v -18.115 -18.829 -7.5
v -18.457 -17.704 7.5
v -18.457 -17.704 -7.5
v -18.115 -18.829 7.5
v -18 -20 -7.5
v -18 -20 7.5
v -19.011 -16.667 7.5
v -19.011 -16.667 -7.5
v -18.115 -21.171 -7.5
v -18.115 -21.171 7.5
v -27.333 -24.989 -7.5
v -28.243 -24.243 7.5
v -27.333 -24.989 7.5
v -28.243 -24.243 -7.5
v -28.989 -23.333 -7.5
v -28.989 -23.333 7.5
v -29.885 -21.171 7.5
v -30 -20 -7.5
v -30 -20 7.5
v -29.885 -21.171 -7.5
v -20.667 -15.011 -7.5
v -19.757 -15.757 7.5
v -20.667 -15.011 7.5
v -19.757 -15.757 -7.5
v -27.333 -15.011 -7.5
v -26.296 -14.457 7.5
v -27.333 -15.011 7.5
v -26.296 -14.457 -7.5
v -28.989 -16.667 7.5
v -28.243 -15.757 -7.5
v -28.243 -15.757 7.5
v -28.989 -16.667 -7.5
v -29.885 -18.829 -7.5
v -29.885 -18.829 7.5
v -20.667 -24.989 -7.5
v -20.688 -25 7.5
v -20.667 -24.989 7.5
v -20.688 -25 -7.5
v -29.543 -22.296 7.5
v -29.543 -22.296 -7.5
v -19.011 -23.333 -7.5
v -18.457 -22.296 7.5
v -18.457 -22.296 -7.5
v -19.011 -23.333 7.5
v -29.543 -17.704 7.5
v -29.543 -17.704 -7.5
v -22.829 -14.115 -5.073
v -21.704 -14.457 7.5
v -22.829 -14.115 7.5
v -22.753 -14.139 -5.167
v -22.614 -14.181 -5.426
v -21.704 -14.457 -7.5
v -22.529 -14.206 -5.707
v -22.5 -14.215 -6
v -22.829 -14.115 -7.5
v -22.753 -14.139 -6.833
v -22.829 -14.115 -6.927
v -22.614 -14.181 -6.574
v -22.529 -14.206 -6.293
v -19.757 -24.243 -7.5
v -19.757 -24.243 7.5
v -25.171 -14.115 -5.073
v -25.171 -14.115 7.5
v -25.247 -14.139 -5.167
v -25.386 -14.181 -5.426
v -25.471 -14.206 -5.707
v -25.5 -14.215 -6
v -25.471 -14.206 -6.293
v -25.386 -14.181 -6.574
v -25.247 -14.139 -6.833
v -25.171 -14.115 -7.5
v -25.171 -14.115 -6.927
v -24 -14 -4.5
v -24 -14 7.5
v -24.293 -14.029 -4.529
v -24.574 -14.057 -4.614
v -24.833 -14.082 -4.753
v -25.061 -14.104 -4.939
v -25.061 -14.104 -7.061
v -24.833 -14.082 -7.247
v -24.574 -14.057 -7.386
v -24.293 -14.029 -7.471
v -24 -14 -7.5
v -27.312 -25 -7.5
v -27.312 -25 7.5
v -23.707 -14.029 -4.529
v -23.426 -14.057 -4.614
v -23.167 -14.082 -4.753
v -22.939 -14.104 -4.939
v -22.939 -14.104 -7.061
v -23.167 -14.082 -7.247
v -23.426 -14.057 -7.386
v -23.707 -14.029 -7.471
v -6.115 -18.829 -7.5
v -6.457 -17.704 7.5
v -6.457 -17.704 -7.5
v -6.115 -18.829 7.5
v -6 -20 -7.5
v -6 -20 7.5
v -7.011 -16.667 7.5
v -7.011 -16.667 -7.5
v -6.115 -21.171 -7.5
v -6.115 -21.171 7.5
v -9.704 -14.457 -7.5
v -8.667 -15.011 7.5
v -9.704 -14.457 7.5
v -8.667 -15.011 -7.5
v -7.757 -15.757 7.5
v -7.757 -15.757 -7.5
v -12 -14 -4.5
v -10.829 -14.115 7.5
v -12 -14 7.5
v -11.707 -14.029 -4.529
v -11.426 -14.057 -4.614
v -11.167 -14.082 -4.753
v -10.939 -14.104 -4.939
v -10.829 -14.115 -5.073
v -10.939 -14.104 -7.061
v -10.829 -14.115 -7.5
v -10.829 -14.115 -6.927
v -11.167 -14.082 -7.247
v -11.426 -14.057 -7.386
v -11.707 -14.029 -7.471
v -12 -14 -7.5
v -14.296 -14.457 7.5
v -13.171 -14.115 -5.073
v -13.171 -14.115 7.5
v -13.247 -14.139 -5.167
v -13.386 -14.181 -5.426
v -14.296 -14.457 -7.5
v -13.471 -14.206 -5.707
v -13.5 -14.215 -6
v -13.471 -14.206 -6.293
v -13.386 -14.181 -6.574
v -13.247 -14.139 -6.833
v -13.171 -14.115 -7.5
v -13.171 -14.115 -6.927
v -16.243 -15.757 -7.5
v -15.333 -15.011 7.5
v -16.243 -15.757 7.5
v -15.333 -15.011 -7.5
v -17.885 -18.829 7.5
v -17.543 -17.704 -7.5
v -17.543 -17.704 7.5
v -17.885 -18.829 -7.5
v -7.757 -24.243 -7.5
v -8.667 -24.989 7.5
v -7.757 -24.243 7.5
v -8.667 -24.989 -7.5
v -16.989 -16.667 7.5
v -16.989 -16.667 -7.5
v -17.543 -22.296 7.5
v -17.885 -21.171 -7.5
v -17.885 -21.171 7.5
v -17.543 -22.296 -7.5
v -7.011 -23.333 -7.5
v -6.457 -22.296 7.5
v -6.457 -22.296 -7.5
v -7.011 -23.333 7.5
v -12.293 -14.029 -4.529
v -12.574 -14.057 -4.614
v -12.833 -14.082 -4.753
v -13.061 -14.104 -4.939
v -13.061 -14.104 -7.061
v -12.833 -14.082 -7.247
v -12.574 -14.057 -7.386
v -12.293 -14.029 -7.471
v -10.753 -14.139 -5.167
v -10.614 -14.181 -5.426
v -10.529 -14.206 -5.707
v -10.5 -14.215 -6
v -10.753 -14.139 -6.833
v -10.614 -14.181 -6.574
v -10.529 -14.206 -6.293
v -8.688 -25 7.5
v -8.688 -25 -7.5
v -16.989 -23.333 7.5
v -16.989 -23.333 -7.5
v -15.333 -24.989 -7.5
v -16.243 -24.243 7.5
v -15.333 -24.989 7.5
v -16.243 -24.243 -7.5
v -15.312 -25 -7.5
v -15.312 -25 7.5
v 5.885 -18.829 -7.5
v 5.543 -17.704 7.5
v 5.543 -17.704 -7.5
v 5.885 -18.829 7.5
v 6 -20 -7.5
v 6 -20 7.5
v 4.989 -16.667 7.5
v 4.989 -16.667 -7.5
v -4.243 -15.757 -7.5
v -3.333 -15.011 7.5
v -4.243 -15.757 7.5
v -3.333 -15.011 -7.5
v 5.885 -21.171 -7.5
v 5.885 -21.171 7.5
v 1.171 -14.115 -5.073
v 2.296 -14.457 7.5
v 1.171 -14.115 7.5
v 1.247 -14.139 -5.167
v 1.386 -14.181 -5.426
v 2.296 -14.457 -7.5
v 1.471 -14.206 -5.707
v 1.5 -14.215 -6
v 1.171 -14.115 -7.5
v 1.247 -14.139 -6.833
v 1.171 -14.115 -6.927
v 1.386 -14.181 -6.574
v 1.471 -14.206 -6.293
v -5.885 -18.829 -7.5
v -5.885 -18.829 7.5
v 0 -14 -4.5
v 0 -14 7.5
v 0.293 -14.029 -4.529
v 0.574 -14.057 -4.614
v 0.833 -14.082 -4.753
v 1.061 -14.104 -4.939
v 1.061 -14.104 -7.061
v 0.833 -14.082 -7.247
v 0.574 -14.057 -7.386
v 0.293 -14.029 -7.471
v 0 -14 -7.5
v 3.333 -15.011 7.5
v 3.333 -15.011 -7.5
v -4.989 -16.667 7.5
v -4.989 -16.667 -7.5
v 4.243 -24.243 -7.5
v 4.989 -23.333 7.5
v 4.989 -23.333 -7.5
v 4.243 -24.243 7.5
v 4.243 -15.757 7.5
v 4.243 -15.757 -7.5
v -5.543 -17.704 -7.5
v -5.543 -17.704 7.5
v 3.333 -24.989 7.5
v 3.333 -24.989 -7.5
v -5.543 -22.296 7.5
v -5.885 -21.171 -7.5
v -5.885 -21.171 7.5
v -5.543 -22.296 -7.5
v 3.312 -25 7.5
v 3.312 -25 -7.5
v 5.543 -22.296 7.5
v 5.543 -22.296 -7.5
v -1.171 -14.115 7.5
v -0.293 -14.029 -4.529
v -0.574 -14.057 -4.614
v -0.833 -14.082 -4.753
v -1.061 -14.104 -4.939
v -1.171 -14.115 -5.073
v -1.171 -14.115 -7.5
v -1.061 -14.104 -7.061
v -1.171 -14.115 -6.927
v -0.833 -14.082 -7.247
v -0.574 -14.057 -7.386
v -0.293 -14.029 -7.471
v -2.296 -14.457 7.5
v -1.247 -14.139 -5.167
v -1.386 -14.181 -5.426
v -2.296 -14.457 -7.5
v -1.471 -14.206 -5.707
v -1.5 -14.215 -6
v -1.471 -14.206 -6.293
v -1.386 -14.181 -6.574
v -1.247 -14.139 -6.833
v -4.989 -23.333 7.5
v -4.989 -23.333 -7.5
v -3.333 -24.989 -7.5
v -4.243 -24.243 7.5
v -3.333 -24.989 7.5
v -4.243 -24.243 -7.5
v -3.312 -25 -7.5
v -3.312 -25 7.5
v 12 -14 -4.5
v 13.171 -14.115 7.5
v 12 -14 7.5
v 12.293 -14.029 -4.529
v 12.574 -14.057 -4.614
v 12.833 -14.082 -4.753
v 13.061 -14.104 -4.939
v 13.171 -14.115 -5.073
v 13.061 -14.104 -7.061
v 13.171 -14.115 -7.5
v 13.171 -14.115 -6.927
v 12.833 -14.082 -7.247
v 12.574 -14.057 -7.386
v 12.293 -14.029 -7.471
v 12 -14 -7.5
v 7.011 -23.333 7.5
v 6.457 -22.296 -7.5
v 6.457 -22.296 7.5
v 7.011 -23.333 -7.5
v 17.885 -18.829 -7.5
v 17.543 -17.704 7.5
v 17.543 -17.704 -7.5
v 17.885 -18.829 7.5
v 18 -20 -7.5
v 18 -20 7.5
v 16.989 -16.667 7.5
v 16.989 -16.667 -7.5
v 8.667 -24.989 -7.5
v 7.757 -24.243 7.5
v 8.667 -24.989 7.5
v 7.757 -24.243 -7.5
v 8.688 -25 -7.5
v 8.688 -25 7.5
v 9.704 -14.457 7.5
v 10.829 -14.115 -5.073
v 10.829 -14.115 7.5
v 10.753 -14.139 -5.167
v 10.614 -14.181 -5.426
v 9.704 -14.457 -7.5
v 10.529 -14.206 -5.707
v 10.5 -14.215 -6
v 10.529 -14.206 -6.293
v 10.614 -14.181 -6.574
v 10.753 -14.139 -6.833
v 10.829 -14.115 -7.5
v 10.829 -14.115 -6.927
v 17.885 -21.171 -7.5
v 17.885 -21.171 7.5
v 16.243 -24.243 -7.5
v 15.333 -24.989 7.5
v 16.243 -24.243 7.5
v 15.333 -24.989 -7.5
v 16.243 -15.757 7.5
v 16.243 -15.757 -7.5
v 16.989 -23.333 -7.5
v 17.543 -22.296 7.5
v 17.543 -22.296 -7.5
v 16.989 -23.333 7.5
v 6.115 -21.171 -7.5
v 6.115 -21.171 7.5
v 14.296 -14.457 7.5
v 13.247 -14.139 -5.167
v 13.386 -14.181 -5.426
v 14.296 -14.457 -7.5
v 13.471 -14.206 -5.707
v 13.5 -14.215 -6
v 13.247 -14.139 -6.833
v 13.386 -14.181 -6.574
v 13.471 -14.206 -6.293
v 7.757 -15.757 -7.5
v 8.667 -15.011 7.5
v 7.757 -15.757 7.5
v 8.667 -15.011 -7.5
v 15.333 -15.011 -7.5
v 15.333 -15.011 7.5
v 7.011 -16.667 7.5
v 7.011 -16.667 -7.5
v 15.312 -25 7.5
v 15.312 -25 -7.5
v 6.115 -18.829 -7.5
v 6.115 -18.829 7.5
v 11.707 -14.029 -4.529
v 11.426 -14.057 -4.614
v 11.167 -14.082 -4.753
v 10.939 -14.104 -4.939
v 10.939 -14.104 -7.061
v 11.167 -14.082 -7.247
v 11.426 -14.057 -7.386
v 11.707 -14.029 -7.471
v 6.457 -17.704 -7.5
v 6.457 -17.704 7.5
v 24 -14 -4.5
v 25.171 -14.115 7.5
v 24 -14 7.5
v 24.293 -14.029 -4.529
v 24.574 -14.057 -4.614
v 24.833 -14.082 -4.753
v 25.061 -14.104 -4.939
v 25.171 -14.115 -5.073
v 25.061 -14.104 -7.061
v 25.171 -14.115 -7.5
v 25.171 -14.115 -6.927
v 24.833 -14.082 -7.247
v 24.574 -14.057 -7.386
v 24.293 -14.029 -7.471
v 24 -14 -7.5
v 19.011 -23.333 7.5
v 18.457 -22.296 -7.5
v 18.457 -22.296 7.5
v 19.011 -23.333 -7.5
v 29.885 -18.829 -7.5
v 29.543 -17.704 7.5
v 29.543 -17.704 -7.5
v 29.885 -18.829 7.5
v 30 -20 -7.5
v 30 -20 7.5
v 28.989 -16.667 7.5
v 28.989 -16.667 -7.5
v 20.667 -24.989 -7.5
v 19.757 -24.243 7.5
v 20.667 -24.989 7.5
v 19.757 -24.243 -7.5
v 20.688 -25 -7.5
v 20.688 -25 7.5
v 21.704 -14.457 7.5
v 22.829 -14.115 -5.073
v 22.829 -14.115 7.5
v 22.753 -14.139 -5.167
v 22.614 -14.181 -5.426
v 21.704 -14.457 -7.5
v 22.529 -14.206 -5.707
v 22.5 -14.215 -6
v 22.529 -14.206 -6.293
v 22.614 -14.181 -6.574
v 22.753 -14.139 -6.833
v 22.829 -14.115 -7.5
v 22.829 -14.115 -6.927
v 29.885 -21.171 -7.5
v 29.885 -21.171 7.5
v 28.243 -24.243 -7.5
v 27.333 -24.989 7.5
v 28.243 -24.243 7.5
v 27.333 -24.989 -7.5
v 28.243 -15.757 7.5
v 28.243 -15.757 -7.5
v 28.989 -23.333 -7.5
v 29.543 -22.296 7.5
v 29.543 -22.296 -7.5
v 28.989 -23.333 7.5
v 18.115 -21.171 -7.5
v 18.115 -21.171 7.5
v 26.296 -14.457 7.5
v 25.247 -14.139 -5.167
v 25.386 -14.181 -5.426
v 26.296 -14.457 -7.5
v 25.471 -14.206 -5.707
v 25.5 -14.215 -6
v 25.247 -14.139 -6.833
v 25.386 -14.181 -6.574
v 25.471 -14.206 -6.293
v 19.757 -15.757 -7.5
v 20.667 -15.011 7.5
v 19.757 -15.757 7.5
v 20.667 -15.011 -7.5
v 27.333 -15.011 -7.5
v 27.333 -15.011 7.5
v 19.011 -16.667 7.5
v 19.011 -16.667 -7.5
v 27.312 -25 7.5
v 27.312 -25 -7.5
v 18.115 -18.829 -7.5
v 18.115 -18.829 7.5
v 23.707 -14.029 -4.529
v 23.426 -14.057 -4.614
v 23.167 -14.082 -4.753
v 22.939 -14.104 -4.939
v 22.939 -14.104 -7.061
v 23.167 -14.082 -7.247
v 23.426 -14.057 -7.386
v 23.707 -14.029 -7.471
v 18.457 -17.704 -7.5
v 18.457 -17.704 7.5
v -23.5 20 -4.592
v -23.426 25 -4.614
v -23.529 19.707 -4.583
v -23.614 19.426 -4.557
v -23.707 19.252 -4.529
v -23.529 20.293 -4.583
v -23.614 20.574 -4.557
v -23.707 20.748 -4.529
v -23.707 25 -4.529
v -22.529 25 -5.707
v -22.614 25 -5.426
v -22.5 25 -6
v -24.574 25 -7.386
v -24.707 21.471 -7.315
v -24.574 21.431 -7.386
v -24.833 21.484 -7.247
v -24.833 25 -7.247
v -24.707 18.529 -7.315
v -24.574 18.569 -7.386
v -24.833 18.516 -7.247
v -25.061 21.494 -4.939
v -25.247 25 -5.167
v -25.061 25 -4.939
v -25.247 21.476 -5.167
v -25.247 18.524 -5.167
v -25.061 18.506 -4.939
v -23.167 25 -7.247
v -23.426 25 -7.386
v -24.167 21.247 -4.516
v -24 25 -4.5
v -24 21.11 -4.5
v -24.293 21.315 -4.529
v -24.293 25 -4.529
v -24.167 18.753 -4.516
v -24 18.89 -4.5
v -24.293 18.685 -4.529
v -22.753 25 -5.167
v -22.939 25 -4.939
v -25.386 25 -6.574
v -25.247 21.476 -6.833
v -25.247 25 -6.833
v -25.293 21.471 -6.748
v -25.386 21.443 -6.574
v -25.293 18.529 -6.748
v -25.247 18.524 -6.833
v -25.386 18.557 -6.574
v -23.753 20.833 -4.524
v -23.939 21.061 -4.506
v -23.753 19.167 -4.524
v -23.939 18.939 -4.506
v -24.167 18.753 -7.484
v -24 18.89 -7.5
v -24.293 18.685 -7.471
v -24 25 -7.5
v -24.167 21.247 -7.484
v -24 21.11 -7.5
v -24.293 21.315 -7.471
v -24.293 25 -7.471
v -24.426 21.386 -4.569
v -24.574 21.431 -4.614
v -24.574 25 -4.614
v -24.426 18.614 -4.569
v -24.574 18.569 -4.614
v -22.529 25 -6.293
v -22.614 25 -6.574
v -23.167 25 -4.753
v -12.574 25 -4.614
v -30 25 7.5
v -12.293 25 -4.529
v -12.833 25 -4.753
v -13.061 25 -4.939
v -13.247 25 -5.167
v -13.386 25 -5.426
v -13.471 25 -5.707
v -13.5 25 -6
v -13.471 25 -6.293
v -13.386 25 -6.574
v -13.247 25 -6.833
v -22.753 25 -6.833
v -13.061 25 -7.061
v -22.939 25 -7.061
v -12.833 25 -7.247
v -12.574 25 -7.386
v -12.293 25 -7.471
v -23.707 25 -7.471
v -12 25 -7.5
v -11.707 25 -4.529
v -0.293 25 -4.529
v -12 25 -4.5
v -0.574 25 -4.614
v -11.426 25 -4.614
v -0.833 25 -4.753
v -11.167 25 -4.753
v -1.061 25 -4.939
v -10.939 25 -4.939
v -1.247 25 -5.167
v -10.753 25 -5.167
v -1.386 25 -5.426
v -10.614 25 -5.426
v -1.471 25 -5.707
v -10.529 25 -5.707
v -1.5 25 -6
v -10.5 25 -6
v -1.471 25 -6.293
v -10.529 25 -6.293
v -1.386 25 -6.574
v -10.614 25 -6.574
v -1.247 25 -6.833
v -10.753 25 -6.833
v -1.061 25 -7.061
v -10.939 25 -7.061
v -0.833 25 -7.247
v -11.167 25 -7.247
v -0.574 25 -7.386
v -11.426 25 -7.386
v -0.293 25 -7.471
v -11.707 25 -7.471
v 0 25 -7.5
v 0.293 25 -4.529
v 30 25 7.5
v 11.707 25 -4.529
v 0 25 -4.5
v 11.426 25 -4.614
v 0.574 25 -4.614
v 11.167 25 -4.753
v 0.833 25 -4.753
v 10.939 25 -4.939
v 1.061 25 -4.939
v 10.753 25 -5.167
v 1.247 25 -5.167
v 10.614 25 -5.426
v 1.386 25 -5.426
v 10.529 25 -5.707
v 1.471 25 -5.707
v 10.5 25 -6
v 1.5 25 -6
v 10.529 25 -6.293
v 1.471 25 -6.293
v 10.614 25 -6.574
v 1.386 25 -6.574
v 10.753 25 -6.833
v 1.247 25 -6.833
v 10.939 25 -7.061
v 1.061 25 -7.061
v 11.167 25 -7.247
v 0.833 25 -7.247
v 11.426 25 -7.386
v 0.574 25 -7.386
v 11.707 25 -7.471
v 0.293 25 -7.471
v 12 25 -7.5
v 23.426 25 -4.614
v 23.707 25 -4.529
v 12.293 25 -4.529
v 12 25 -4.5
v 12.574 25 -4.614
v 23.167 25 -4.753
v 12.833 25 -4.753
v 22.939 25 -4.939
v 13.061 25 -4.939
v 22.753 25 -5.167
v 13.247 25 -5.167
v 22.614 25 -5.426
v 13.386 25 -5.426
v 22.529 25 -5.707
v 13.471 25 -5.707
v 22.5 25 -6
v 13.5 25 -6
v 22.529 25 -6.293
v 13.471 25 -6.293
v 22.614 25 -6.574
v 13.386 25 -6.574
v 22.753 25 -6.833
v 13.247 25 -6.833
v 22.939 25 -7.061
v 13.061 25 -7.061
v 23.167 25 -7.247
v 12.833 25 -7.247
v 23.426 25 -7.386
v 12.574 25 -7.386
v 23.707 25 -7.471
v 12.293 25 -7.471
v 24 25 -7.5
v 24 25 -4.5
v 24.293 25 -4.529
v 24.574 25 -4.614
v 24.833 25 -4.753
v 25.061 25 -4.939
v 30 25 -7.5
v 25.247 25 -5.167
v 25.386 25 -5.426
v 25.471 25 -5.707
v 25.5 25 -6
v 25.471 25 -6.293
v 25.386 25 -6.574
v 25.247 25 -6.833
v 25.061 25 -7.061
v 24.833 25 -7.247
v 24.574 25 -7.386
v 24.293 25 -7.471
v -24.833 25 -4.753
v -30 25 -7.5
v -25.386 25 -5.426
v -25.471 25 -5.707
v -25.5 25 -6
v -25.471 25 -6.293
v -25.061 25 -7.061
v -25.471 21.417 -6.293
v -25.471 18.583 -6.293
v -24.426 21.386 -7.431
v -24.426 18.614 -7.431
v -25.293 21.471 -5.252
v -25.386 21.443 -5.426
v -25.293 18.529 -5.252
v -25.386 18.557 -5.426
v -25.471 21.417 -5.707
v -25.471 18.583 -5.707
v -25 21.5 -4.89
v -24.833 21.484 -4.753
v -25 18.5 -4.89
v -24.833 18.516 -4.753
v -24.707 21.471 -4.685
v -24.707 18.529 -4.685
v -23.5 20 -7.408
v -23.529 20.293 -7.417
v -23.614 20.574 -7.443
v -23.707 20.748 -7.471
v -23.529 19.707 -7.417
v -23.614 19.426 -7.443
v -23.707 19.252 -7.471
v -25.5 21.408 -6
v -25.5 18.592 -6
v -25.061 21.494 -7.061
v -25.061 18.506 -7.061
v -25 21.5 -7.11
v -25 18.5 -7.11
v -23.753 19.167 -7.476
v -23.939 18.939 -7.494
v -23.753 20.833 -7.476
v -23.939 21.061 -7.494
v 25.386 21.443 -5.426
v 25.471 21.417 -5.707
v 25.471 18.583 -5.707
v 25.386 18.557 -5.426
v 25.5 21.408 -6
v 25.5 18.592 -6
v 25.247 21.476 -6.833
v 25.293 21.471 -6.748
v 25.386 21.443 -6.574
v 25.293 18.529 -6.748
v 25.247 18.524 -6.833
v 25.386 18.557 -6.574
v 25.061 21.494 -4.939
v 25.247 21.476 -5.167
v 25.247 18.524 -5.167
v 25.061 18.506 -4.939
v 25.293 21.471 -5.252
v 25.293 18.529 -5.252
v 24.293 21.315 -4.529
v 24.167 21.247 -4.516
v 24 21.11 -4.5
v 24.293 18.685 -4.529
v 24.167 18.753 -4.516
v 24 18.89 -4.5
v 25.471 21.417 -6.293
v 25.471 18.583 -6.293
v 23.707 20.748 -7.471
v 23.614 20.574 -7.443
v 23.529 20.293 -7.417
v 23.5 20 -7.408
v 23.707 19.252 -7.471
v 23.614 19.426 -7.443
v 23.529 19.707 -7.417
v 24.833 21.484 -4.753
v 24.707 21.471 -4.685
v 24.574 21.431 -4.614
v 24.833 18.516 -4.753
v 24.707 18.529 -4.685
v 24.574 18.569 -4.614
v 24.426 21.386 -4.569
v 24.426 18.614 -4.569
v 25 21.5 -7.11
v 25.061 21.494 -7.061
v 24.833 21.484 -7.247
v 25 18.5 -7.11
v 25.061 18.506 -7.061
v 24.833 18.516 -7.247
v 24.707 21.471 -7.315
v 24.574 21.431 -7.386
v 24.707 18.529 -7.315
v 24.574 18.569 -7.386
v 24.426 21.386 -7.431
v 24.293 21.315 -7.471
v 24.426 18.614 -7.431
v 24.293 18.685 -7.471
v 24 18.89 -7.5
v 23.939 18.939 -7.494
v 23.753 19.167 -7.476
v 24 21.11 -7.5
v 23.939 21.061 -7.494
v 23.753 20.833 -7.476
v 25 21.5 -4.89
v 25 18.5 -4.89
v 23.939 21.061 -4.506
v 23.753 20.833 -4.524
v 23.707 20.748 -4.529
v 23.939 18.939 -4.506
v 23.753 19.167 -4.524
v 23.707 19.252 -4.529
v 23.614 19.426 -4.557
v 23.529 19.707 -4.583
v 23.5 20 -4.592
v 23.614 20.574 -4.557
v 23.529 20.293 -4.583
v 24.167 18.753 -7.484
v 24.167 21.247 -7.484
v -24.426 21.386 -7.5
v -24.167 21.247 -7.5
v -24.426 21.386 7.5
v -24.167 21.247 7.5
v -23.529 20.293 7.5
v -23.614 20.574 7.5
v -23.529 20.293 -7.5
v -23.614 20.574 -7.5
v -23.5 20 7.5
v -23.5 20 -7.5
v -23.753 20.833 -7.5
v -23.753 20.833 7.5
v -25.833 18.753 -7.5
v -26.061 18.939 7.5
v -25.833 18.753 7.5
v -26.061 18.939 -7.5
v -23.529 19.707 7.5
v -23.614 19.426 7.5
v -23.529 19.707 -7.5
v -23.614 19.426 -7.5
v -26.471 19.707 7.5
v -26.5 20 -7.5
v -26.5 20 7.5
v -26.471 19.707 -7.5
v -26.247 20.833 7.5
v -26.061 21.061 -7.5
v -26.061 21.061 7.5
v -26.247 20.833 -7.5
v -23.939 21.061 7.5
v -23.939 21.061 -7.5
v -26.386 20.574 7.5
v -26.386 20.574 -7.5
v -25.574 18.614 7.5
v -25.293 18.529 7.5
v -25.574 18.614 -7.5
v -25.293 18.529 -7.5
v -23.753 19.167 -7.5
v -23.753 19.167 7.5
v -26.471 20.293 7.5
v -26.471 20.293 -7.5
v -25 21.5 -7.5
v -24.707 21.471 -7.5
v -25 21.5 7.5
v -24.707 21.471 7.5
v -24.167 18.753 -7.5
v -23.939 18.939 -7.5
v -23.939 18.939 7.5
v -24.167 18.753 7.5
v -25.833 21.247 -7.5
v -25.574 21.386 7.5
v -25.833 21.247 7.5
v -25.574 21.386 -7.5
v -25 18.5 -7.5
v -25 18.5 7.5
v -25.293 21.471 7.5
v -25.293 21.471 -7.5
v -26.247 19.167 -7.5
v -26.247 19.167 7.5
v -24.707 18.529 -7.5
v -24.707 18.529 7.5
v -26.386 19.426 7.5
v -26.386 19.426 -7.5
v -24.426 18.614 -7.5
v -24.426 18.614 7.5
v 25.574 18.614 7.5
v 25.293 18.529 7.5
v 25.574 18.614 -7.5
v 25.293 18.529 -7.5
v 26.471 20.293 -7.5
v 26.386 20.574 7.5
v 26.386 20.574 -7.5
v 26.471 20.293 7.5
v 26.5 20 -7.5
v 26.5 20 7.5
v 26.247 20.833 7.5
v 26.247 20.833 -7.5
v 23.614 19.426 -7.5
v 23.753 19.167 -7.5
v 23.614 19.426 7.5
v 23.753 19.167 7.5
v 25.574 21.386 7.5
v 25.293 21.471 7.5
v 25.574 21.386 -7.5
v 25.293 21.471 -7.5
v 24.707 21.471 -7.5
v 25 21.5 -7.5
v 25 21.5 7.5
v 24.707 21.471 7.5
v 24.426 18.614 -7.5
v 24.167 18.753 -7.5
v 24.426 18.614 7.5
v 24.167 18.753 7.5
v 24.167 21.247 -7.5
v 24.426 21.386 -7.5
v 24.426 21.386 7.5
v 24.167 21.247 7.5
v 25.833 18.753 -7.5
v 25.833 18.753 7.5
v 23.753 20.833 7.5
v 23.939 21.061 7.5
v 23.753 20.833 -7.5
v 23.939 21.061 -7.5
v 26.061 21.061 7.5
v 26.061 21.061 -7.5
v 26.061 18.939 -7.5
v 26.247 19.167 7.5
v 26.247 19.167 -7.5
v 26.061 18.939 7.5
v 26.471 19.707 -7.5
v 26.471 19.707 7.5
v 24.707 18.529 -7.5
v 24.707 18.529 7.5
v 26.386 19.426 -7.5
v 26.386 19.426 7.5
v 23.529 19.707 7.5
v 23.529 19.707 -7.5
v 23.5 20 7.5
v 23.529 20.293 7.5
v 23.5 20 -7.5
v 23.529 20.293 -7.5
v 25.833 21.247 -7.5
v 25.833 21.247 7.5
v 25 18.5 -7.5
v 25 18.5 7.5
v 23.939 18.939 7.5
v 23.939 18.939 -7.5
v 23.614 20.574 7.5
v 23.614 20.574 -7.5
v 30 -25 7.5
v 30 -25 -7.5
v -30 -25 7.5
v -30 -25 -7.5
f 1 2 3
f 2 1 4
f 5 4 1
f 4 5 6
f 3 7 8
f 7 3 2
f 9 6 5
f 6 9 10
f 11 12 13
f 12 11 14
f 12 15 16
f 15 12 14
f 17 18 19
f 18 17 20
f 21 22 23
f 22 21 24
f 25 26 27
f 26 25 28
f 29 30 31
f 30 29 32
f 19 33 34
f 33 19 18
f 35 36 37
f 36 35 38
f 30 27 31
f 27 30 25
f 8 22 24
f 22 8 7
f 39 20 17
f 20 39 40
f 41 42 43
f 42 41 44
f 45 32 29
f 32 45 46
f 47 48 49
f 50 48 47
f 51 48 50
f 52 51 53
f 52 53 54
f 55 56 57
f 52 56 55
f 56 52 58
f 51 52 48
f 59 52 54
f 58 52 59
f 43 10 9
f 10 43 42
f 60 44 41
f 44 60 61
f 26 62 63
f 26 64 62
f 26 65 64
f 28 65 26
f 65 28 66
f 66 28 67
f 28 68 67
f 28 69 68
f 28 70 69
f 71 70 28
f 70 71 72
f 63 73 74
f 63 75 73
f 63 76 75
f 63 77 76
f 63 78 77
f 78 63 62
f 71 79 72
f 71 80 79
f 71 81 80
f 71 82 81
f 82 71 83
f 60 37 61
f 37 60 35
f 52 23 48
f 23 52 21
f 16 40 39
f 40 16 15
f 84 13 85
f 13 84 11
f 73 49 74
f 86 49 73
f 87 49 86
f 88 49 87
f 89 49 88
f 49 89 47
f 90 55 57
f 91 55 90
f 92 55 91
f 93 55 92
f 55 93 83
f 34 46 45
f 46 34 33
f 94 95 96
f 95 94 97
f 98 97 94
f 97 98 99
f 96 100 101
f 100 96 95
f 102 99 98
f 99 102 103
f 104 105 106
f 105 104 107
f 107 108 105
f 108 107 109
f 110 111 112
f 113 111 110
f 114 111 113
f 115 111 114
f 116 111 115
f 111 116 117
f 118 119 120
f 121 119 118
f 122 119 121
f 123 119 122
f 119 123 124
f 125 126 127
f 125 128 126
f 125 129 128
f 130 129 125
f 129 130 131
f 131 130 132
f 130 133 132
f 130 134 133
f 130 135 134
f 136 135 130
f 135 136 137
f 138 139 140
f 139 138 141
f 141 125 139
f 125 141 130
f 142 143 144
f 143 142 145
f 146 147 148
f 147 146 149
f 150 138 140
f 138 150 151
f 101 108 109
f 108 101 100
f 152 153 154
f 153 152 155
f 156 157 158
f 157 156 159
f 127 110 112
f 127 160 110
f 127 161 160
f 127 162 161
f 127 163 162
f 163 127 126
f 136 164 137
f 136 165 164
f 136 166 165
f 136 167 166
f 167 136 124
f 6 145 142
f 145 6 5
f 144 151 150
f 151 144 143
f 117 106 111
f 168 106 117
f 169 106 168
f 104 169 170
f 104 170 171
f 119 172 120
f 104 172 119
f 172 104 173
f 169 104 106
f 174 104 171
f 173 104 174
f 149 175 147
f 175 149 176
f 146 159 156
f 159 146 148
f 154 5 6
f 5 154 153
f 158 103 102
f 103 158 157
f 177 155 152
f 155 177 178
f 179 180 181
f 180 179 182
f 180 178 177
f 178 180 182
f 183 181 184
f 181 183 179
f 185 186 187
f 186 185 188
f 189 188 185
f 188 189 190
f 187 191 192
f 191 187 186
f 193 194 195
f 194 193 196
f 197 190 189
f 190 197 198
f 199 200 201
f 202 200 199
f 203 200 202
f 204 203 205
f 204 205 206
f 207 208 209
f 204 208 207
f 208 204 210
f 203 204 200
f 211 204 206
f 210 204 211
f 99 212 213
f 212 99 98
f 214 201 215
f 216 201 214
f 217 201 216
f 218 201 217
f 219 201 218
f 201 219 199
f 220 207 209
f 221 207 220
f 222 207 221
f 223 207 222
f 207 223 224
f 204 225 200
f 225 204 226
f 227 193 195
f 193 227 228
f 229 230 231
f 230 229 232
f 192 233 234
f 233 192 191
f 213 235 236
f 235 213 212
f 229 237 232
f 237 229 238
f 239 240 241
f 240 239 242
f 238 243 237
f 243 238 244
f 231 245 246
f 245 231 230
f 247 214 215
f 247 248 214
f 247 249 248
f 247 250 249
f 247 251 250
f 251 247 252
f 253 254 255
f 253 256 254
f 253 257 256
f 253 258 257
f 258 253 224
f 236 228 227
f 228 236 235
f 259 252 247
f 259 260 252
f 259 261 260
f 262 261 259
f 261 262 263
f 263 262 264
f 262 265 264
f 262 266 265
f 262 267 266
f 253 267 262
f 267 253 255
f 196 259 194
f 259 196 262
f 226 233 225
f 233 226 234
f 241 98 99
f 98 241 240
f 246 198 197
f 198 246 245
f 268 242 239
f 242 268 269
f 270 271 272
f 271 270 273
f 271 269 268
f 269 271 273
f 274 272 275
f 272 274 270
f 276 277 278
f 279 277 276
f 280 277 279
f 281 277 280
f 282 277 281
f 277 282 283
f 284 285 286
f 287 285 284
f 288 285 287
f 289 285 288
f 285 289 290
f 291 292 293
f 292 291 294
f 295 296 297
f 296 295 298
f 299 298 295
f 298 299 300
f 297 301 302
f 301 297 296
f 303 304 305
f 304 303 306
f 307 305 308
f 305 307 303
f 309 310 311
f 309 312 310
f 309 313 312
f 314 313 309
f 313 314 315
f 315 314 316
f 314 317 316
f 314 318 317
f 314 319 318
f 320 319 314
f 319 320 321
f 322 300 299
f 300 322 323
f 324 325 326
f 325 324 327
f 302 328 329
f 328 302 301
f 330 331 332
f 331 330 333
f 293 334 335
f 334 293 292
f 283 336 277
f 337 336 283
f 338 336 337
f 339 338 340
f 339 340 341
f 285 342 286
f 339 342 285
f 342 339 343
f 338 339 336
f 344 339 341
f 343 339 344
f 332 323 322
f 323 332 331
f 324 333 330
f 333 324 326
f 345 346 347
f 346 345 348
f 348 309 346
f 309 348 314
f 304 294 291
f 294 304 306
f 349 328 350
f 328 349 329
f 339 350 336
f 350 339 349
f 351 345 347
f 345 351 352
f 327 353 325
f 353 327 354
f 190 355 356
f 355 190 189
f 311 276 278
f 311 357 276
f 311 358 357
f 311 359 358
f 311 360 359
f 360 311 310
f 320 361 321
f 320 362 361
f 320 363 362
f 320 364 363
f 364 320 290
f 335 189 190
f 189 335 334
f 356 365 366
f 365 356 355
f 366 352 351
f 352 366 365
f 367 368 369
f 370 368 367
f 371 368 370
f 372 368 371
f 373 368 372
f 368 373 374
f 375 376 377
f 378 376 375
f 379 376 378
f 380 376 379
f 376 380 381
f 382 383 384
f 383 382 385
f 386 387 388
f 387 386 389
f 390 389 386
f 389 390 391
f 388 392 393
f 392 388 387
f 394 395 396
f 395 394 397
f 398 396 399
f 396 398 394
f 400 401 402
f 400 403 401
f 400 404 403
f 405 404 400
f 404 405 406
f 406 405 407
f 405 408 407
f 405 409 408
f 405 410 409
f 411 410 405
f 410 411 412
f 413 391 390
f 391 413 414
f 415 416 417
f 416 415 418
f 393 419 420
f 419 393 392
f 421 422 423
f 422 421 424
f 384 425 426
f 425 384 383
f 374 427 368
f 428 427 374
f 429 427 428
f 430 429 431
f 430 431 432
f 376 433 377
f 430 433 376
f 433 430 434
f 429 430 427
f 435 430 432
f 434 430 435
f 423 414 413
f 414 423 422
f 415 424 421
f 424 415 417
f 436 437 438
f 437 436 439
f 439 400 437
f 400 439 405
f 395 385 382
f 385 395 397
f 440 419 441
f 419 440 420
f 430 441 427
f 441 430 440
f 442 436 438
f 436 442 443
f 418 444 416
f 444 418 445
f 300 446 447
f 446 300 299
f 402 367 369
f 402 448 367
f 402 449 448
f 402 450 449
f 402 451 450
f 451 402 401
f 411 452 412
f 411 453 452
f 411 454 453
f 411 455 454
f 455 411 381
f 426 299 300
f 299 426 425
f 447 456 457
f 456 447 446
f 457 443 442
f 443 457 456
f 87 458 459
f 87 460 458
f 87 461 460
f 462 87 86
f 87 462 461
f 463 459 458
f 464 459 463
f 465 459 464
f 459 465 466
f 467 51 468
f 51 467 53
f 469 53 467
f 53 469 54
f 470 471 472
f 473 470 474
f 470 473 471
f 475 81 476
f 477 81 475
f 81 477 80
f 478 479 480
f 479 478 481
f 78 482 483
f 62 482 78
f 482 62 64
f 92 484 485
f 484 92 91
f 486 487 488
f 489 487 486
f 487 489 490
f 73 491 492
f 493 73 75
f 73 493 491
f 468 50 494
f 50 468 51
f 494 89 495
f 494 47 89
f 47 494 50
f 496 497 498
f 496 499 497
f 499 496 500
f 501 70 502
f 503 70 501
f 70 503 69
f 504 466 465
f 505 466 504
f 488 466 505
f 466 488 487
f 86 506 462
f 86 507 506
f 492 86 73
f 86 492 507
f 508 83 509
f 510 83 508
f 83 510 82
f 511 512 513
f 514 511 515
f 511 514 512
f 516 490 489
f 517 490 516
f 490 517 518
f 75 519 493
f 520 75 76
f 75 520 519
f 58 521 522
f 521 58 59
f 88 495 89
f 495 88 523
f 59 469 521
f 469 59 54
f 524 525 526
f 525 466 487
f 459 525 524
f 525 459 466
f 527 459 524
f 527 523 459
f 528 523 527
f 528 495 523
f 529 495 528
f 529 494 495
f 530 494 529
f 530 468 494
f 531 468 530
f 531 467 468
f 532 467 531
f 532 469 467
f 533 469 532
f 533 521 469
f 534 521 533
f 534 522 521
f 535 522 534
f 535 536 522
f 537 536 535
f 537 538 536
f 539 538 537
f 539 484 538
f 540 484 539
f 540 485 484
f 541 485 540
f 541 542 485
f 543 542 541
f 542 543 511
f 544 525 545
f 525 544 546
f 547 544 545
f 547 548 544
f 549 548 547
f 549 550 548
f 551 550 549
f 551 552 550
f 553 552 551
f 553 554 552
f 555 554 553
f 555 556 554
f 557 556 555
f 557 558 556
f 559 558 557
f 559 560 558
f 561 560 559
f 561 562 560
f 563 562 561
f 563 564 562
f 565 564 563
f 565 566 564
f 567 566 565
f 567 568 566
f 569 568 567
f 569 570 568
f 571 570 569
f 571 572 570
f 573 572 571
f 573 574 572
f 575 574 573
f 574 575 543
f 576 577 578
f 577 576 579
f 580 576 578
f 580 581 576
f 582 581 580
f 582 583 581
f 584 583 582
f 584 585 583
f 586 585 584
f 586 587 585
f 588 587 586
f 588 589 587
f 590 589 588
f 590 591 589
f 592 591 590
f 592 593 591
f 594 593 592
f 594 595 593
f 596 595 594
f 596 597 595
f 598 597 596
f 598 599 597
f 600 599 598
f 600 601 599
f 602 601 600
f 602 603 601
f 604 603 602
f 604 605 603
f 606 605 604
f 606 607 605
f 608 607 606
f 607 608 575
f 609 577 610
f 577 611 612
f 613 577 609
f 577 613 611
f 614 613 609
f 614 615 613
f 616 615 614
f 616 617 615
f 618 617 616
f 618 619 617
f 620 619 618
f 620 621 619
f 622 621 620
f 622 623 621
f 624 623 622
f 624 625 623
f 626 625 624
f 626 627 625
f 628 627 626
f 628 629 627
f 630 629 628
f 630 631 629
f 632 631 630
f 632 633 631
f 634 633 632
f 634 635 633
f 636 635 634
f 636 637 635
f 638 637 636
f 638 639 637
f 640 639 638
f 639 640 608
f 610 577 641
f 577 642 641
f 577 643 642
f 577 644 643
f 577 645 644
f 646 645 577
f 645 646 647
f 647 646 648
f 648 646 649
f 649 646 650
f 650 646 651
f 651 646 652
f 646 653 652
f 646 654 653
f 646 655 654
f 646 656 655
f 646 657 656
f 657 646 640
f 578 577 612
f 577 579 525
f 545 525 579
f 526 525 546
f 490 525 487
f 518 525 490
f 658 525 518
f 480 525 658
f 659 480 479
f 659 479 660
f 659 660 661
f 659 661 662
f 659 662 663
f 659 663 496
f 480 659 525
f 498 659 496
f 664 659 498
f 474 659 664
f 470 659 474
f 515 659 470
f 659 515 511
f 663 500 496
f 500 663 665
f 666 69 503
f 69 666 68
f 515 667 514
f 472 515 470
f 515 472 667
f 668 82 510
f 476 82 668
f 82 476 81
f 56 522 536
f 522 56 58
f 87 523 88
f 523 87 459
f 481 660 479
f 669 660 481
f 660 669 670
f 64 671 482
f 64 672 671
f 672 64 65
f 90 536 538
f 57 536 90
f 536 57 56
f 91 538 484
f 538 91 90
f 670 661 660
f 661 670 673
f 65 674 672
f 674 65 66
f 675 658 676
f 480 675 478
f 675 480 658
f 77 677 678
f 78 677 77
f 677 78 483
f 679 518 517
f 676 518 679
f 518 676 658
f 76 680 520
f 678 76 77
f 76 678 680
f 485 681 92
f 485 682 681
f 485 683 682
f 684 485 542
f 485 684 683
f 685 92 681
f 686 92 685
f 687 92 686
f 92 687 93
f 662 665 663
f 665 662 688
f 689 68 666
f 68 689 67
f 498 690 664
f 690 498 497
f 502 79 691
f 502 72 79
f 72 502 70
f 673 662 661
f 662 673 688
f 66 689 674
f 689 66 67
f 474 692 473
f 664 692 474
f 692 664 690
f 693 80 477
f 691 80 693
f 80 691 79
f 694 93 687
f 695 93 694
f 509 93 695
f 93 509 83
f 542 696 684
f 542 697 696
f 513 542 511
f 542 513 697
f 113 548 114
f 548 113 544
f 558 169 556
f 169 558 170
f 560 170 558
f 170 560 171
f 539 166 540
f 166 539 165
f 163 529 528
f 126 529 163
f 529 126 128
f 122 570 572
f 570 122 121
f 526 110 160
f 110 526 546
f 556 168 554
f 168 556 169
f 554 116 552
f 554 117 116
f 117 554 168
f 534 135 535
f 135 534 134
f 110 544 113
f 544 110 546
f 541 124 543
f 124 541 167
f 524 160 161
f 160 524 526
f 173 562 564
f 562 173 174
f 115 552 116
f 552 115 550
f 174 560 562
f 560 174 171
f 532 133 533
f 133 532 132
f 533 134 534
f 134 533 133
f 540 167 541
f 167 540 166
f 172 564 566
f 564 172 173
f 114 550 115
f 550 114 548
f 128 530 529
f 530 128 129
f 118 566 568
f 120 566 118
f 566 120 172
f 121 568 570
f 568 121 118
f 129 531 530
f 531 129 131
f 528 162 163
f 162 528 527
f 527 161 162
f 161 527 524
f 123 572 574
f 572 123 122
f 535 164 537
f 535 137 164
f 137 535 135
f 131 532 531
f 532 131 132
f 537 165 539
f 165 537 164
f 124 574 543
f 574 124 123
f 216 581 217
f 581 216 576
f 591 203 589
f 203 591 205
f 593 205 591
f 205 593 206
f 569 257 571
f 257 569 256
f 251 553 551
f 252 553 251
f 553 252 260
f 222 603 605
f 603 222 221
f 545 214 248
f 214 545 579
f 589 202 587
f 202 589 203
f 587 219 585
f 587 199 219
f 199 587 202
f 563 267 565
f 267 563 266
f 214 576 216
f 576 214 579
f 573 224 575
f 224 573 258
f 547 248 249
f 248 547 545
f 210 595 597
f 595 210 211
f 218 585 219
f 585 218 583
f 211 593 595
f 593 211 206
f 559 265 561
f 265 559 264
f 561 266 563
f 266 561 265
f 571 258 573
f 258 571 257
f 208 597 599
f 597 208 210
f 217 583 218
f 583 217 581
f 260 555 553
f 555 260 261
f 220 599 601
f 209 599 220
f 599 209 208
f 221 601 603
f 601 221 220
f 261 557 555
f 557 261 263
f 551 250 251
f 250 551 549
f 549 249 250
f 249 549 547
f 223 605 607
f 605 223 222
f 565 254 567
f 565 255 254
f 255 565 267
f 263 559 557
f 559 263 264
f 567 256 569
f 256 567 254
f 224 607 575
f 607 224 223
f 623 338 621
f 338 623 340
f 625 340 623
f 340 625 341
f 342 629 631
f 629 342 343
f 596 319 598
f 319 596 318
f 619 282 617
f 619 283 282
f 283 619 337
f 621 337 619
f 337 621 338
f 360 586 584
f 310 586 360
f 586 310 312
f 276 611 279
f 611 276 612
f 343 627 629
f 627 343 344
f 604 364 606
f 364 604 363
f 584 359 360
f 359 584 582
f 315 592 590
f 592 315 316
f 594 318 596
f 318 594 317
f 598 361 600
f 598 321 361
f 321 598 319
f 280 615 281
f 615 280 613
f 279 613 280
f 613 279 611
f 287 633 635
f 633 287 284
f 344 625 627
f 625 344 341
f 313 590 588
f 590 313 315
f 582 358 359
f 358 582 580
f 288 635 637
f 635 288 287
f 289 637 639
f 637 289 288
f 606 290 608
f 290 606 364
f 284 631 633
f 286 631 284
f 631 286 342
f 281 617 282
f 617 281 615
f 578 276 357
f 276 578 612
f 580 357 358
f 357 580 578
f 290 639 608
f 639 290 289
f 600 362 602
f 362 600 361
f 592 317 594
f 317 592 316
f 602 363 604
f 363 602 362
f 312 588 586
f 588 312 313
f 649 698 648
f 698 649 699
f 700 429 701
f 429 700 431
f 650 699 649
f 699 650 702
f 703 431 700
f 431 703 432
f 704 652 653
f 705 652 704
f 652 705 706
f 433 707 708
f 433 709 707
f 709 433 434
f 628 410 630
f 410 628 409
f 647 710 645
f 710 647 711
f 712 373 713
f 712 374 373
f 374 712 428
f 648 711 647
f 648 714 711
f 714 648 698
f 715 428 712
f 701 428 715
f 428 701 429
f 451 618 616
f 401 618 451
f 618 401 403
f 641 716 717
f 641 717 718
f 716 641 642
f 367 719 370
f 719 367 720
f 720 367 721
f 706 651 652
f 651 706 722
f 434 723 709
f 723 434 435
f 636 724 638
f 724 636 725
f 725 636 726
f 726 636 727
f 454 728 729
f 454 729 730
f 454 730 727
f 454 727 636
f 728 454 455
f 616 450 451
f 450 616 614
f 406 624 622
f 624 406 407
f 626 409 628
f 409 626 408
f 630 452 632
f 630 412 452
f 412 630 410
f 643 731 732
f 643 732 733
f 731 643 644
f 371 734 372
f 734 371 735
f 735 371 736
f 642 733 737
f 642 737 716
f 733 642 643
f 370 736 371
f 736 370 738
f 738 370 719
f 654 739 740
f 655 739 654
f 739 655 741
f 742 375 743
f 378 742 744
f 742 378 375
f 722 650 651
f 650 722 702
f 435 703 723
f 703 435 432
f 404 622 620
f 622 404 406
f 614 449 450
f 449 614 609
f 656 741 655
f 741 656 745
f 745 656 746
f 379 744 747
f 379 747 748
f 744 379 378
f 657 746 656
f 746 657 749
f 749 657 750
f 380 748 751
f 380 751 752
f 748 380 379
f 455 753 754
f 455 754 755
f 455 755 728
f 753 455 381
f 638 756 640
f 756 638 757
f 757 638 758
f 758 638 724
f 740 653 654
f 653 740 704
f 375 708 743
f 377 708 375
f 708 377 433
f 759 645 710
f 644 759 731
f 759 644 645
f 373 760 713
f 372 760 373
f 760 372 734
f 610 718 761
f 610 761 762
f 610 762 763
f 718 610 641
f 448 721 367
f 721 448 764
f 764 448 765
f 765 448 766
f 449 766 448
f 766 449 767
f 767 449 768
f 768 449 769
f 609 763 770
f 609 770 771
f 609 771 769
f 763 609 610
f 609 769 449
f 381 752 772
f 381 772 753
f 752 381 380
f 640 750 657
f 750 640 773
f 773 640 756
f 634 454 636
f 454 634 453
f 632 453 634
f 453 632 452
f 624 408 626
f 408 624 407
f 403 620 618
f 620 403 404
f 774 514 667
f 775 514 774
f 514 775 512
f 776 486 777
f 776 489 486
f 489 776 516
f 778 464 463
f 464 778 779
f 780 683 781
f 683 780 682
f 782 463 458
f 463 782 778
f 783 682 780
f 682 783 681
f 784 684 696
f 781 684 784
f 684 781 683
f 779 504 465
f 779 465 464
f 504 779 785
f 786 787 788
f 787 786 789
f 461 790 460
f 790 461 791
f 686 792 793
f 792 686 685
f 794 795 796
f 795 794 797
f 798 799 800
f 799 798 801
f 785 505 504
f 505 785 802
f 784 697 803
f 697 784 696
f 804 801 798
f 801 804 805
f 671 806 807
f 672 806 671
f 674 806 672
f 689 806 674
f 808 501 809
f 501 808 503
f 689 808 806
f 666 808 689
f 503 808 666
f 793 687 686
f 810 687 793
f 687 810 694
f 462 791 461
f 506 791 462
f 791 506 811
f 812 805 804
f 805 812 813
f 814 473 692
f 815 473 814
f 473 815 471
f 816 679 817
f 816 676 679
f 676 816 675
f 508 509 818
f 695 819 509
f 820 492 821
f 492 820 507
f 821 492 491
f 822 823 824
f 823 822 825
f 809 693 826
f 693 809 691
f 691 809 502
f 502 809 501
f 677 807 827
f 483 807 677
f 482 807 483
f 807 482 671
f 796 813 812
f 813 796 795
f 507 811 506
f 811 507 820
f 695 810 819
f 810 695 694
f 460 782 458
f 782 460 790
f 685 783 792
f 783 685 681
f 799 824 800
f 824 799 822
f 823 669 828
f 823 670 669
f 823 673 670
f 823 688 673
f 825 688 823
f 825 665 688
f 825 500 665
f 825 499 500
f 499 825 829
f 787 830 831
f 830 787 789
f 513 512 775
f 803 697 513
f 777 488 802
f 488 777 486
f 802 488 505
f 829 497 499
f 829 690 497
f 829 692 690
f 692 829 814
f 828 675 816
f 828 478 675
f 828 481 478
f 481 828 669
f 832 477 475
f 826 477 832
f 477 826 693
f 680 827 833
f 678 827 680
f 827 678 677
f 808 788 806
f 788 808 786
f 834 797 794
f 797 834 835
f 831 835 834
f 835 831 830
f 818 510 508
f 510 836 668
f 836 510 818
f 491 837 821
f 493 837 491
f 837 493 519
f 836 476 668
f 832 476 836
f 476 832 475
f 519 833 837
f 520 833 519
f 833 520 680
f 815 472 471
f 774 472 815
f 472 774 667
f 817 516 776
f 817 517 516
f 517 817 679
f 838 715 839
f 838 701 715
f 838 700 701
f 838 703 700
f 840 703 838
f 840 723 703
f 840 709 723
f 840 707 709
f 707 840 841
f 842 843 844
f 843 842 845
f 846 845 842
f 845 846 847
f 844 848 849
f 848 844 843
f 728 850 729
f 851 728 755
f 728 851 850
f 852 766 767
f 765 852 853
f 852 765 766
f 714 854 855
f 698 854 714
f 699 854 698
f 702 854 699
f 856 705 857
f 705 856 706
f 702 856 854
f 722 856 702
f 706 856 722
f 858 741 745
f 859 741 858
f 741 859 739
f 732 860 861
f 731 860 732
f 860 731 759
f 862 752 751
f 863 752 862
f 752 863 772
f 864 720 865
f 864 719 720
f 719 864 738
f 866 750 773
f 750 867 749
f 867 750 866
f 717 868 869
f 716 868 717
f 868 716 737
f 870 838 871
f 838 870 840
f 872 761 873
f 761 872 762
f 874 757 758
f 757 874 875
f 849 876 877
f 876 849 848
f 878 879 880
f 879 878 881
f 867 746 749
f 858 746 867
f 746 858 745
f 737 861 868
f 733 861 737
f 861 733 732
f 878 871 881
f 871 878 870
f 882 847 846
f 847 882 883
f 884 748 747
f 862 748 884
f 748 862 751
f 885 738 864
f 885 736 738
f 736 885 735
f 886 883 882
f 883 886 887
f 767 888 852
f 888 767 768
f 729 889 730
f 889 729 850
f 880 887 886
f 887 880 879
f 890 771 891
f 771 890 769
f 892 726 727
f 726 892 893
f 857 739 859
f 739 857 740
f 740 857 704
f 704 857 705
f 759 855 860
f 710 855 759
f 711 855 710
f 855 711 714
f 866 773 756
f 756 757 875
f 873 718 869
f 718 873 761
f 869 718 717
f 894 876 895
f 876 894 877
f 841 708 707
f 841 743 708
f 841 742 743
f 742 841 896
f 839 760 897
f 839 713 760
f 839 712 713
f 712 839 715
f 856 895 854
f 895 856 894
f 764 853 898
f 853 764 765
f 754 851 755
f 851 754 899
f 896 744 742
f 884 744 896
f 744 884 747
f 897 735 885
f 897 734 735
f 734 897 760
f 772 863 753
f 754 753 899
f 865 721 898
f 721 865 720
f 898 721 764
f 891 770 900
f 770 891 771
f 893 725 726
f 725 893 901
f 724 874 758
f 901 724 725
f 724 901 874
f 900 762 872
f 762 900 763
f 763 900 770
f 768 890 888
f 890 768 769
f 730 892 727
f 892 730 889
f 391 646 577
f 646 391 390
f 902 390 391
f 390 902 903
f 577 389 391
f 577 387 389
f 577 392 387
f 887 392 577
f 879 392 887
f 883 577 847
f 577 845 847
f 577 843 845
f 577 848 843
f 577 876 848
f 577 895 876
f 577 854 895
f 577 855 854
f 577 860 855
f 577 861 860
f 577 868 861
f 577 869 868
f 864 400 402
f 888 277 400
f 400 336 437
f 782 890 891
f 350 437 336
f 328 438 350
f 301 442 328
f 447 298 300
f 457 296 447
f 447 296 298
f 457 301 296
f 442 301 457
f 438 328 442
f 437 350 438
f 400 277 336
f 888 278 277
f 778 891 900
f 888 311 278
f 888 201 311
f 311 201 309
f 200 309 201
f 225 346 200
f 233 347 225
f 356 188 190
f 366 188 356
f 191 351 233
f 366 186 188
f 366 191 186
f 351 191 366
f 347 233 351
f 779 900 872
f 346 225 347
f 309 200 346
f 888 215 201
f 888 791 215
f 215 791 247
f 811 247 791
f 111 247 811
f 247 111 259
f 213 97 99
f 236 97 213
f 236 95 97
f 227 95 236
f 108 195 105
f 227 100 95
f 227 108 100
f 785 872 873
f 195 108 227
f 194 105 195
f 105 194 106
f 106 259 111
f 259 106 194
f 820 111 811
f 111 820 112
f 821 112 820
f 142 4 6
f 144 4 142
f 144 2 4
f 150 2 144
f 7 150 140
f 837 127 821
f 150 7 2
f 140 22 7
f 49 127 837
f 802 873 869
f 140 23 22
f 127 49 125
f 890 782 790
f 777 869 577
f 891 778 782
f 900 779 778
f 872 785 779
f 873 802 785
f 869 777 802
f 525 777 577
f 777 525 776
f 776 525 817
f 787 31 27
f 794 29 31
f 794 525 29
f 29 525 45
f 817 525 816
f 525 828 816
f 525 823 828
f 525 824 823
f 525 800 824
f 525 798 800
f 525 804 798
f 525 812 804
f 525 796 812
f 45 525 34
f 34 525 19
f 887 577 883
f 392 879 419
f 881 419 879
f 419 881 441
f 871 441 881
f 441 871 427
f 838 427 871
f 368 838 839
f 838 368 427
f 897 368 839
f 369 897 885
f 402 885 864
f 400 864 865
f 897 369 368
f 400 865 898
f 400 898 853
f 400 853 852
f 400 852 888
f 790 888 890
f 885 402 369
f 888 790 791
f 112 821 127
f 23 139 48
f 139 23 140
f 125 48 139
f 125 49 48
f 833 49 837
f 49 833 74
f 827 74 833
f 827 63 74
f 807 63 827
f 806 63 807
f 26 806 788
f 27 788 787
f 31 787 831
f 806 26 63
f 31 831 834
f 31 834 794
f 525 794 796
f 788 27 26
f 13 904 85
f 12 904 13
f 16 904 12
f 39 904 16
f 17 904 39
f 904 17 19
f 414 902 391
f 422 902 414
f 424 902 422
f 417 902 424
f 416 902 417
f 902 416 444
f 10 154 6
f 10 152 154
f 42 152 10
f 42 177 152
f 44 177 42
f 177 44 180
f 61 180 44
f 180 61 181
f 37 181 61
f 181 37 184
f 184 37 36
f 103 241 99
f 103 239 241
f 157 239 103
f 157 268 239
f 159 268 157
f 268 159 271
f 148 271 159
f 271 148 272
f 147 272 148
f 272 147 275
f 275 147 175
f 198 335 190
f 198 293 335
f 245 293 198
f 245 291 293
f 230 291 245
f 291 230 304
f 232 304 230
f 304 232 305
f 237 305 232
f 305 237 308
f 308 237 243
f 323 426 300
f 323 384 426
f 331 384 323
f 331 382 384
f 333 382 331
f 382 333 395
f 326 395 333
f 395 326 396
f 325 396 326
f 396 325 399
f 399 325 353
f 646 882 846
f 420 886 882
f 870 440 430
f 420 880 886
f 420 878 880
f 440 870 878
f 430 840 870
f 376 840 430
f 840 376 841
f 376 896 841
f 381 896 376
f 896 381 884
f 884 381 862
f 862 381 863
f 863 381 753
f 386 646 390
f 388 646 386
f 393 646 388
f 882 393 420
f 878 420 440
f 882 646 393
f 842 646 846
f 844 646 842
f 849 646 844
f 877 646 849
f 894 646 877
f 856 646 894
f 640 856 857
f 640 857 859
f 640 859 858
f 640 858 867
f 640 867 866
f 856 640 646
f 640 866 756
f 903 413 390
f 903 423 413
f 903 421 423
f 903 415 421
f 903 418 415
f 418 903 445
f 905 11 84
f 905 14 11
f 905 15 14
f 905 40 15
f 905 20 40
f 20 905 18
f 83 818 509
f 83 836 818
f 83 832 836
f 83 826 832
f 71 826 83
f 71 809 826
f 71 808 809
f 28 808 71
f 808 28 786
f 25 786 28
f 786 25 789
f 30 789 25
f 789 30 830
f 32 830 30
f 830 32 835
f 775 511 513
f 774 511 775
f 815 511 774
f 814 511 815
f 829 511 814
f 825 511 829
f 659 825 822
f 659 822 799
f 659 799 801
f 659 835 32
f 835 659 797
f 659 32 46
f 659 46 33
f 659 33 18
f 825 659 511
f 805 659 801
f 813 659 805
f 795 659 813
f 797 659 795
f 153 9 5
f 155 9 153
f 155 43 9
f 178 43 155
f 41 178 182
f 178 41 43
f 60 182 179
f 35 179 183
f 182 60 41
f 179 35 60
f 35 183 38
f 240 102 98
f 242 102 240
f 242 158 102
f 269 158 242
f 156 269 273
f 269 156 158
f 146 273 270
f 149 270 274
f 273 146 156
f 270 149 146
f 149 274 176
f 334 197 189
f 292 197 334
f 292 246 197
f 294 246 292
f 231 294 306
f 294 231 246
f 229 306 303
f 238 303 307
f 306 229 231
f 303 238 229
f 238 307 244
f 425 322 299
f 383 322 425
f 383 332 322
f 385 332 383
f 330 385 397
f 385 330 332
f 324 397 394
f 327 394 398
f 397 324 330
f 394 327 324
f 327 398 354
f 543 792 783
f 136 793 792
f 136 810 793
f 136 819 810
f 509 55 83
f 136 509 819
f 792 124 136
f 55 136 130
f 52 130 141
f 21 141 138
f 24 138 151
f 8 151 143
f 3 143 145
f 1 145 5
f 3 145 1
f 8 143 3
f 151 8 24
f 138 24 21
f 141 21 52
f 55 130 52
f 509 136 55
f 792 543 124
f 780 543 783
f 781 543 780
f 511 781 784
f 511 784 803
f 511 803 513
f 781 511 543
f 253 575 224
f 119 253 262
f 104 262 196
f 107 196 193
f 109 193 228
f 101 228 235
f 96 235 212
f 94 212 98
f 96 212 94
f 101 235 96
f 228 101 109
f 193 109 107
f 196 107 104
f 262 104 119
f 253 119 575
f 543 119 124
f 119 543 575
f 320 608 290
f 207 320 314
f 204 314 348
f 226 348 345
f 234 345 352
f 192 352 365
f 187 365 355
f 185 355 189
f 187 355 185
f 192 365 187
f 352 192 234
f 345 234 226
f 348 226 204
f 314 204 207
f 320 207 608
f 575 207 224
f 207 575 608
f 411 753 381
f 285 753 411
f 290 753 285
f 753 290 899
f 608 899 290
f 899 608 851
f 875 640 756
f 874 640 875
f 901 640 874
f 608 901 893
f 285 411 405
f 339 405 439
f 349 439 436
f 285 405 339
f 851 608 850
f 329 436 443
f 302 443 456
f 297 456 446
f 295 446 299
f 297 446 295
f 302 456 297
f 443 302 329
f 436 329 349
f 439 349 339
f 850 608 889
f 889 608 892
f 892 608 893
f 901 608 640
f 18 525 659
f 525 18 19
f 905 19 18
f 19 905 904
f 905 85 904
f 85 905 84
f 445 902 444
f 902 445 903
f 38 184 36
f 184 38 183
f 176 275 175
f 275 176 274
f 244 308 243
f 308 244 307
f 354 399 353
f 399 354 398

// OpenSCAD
// COBRA Hand Palm - RIGHT

$fn = 32;

module palm() {
    difference() {
        cube([60, 50, 15], center=true);
        
        // Motor cavities
        for(i = [0:4]) {
            translate([(i - 2) * 12, -20, 0])
            cylinder(h=17, d=12, center=true);
        }
        
        // Tendon channels
        for(i = [0:4]) {
            translate([(i - 2) * 12, 0, -6])
            rotate([90, 0, 0])
            cylinder(h=50, d=3, center=true);
        }
        
        // Mounting holes
        for(x = [-25, 25]) {
            for(y = [-20, 20]) {
                translate([x, y, 0])
                cylinder(h=17, d=3, center=true);
            }
        }
    }
}

palm();
